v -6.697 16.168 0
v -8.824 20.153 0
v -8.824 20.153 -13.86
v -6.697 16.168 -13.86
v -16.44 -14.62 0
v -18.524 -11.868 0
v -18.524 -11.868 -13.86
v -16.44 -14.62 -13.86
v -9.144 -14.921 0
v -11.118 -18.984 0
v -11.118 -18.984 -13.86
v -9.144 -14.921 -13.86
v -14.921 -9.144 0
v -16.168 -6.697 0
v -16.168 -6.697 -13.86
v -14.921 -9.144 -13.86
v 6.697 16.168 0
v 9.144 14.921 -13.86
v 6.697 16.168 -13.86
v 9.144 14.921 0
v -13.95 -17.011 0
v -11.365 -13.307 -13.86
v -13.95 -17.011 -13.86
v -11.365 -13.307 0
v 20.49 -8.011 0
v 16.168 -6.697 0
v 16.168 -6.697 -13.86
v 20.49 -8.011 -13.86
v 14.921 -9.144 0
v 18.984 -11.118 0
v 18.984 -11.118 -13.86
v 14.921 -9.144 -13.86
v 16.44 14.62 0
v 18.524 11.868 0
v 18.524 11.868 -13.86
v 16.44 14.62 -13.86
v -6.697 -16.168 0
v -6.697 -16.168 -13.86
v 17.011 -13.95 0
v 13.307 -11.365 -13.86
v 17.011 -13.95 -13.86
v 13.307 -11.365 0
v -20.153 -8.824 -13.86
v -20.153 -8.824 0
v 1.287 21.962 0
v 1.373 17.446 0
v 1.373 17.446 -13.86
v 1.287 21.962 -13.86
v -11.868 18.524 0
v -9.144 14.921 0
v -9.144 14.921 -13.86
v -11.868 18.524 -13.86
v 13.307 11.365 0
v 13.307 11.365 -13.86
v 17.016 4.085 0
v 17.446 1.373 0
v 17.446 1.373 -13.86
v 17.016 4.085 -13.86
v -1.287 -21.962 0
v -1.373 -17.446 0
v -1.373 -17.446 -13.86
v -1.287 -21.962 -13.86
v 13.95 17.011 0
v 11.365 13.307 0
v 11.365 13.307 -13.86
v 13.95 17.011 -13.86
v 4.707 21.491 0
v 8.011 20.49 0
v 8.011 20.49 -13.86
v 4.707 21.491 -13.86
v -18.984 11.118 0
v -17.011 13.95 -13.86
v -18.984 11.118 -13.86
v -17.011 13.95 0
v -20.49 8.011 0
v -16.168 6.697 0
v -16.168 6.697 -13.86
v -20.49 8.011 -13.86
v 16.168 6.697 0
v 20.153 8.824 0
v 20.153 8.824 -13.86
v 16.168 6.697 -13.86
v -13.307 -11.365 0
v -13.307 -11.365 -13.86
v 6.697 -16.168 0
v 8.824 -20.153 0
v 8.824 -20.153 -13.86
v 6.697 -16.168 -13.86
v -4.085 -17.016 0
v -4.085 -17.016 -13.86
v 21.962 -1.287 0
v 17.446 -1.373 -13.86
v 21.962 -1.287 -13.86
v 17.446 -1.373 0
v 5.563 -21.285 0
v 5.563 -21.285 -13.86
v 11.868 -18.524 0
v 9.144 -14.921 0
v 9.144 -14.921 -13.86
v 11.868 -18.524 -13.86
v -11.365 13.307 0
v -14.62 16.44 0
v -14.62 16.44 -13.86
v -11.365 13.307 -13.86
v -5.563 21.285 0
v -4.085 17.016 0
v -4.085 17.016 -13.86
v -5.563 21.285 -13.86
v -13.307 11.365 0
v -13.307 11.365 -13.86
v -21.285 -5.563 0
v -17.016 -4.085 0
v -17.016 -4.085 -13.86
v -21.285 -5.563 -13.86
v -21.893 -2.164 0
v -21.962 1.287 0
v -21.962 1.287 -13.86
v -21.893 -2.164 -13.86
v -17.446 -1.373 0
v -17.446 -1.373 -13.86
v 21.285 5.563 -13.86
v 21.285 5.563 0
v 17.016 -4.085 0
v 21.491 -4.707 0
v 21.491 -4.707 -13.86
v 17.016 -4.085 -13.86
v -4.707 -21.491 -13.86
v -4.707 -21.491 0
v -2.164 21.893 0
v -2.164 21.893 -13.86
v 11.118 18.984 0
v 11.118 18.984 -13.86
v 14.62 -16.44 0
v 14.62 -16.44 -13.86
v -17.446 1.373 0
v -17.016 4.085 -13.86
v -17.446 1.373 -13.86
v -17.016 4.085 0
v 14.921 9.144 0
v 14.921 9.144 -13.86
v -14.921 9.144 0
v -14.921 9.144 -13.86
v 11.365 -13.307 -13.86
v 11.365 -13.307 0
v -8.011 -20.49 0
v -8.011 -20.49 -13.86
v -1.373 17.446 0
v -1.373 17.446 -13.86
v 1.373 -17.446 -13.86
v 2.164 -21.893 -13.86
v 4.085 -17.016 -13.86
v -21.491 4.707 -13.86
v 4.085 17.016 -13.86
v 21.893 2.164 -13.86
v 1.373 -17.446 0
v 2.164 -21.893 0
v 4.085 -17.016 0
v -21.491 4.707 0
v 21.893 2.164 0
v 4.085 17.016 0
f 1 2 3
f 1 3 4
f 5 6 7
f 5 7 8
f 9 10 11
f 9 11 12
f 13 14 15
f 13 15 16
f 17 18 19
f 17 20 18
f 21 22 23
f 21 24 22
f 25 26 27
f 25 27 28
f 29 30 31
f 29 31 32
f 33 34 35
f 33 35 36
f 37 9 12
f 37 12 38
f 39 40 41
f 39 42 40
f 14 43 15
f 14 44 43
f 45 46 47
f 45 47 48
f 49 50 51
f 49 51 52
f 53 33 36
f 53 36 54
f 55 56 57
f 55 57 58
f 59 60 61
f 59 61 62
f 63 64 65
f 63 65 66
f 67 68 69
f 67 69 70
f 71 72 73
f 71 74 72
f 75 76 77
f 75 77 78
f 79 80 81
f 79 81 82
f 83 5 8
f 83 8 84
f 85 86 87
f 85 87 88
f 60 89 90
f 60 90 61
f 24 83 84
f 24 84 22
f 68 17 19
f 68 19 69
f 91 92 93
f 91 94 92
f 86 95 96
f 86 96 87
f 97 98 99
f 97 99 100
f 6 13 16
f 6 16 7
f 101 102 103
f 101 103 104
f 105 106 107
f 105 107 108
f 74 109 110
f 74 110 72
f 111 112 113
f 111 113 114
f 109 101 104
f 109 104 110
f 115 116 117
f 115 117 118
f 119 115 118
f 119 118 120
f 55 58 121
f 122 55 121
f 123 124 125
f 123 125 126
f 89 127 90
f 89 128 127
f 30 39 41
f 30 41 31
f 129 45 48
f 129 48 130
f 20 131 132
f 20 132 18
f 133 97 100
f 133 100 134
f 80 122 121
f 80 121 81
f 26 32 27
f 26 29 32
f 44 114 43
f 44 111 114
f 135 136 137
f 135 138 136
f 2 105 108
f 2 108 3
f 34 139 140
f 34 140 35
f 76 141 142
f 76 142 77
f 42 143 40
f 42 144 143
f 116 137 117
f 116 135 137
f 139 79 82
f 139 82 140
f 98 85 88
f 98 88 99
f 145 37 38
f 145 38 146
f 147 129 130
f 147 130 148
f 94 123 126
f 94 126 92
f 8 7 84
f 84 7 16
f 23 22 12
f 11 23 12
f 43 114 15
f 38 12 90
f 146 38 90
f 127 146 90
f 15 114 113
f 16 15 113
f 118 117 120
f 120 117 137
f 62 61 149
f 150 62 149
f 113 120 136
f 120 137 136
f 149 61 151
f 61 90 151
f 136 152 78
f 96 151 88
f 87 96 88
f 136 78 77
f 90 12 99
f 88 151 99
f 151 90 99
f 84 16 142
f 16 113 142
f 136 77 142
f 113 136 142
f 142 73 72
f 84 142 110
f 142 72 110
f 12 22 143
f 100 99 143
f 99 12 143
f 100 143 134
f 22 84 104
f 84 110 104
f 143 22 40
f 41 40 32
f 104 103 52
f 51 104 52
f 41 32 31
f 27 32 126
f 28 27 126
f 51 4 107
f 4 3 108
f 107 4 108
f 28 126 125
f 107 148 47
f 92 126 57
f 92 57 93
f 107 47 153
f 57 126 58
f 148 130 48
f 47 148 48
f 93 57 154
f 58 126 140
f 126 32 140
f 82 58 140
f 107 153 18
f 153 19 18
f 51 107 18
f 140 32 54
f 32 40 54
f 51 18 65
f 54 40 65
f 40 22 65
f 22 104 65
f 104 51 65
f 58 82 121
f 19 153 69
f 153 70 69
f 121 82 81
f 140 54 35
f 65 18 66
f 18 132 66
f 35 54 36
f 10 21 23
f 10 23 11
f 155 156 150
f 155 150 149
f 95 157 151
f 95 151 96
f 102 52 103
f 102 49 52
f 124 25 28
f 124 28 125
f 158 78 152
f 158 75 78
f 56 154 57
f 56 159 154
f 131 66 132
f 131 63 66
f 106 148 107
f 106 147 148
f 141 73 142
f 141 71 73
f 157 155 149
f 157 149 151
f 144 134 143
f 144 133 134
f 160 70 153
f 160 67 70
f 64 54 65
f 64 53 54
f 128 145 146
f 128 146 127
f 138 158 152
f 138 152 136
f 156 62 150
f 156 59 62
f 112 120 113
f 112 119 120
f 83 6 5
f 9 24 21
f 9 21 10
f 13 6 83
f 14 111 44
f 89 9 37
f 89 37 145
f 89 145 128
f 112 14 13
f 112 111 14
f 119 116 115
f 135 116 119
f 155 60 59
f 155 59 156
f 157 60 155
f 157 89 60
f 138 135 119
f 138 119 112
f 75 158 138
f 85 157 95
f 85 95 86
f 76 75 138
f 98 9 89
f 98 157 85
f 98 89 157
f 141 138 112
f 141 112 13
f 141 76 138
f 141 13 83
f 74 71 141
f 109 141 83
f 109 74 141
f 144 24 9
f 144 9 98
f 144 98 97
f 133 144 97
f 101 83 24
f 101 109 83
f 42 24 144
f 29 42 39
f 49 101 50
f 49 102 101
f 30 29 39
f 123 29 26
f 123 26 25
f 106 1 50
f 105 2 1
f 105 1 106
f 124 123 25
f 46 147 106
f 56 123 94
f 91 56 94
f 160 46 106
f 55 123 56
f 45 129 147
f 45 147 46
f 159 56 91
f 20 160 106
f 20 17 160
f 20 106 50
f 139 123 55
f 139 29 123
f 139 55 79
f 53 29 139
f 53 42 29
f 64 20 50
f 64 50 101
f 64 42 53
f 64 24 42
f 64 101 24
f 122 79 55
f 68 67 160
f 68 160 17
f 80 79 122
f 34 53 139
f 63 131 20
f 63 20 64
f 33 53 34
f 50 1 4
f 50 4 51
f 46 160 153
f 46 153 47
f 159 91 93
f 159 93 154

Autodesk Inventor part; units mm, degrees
ref_plane "YZ Plane" through (0, 0, 0) normal (1, 0, 0) x (0, 1, 0)
ref_plane "XZ Plane" through (0, 0, 0) normal (0, 1, 0) x (-1, 0, 0)
ref_plane "XY Plane" through (0, 0, 0) normal (0, 0, 1) x (1, 0, 0)
sketch "Gear_Profile_Sketch" plane through (0, 0, 0) normal (0, 0, 1) x (1, 0, 0)
  line L0 (17.4461, -1.373) -> (21.9623, -1.2871)
  line L1 (21.9623, -1.2871) -> (21.8933, 2.1644)
  line L2 (21.8933, 2.1644) -> (17.4461, 1.373)
  line L3 (17.4461, 1.373) -> (17.0165, 4.0853)
  line L4 (17.0165, 4.0853) -> (21.2852, 5.5626)
  line L5 (21.2852, 5.5626) -> (20.1529, 8.8238)
  line L6 (20.1529, 8.8238) -> (16.1679, 6.697)
  line L7 (16.1679, 6.697) -> (14.9212, 9.1437)
  line L8 (14.9212, 9.1437) -> (18.5244, 11.8678)
  line L9 (18.5244, 11.8678) -> (16.4398, 14.6196)
  line L10 (16.4398, 14.6196) -> (13.3071, 11.3653)
  line L11 (13.3071, 11.3653) -> (11.3653, 13.3071)
  line L12 (11.3653, 13.3071) -> (13.9504, 17.0113)
  line L13 (13.9504, 17.0113) -> (11.1175, 18.9842)
  line L14 (11.1175, 18.9842) -> (9.1437, 14.9212)
  line L15 (9.1437, 14.9212) -> (6.697, 16.1679)
  line L16 (6.697, 16.1679) -> (8.0109, 20.4897)
  line L17 (8.0109, 20.4897) -> (4.707, 21.4906)
  line L18 (4.707, 21.4906) -> (4.0853, 17.0165)
  line L19 (4.0853, 17.0165) -> (1.373, 17.4461)
  line L20 (1.373, 17.4461) -> (1.2871, 21.9623)
  line L21 (1.2871, 21.9623) -> (-2.1644, 21.8933)
  line L22 (-2.1644, 21.8933) -> (-1.373, 17.4461)
  line L23 (-1.373, 17.4461) -> (-4.0853, 17.0165)
  line L24 (-4.0853, 17.0165) -> (-5.5626, 21.2852)
  line L25 (-5.5626, 21.2852) -> (-8.8238, 20.1529)
  line L26 (-8.8238, 20.1529) -> (-6.697, 16.1679)
  line L27 (-6.697, 16.1679) -> (-9.1437, 14.9212)
  line L28 (-9.1437, 14.9212) -> (-11.8678, 18.5244)
  line L29 (-11.8678, 18.5244) -> (-14.6196, 16.4398)
  line L30 (-14.6196, 16.4398) -> (-11.3653, 13.3071)
  line L31 (-11.3653, 13.3071) -> (-13.3071, 11.3653)
  line L32 (-13.3071, 11.3653) -> (-17.0113, 13.9504)
  line L33 (-17.0113, 13.9504) -> (-18.9842, 11.1175)
  line L34 (-18.9842, 11.1175) -> (-14.9212, 9.1437)
  line L35 (-14.9212, 9.1437) -> (-16.1679, 6.697)
  line L36 (-16.1679, 6.697) -> (-20.4897, 8.0109)
  line L37 (-20.4897, 8.0109) -> (-21.4906, 4.707)
  line L38 (-21.4906, 4.707) -> (-17.0165, 4.0853)
  line L39 (-17.0165, 4.0853) -> (-17.4461, 1.373)
  line L40 (-17.4461, 1.373) -> (-21.9623, 1.2871)
  line L41 (-21.9623, 1.2871) -> (-21.8933, -2.1644)
  line L42 (-21.8933, -2.1644) -> (-17.4461, -1.373)
  line L43 (-17.4461, -1.373) -> (-17.0165, -4.0853)
  line L44 (-17.0165, -4.0853) -> (-21.2852, -5.5626)
  line L45 (-21.2852, -5.5626) -> (-20.1529, -8.8238)
  line L46 (-20.1529, -8.8238) -> (-16.1679, -6.697)
  line L47 (-16.1679, -6.697) -> (-14.9212, -9.1437)
  line L48 (-14.9212, -9.1437) -> (-18.5244, -11.8678)
  line L49 (-18.5244, -11.8678) -> (-16.4398, -14.6196)
  line L50 (-16.4398, -14.6196) -> (-13.3071, -11.3653)
  line L51 (-13.3071, -11.3653) -> (-11.3653, -13.3071)
  line L52 (-11.3653, -13.3071) -> (-13.9504, -17.0113)
  line L53 (-13.9504, -17.0113) -> (-11.1175, -18.9842)
  line L54 (-11.1175, -18.9842) -> (-9.1437, -14.9212)
  line L55 (-9.1437, -14.9212) -> (-6.697, -16.1679)
  line L56 (-6.697, -16.1679) -> (-8.0109, -20.4897)
  line L57 (-8.0109, -20.4897) -> (-4.707, -21.4906)
  line L58 (-4.707, -21.4906) -> (-4.0853, -17.0165)
  line L59 (-4.0853, -17.0165) -> (-1.373, -17.4461)
  line L60 (-1.373, -17.4461) -> (-1.2871, -21.9623)
  line L61 (-1.2871, -21.9623) -> (2.1644, -21.8933)
  line L62 (2.1644, -21.8933) -> (1.373, -17.4461)
  line L63 (1.373, -17.4461) -> (4.0853, -17.0165)
  line L64 (4.0853, -17.0165) -> (5.5626, -21.2852)
  line L65 (5.5626, -21.2852) -> (8.8238, -20.1529)
  line L66 (8.8238, -20.1529) -> (6.697, -16.1679)
  line L67 (6.697, -16.1679) -> (9.1437, -14.9212)
  line L68 (9.1437, -14.9212) -> (11.8678, -18.5244)
  line L69 (11.8678, -18.5244) -> (14.6196, -16.4398)
  line L70 (14.6196, -16.4398) -> (11.3653, -13.3071)
  line L71 (11.3653, -13.3071) -> (13.3071, -11.3653)
  line L72 (13.3071, -11.3653) -> (17.0113, -13.9504)
  line L73 (17.0113, -13.9504) -> (18.9842, -11.1175)
  line L74 (18.9842, -11.1175) -> (14.9212, -9.1437)
  line L75 (14.9212, -9.1437) -> (16.1679, -6.697)
  line L76 (16.1679, -6.697) -> (20.4897, -8.0109)
  line L77 (20.4897, -8.0109) -> (21.4906, -4.707)
  line L78 (21.4906, -4.707) -> (17.0165, -4.0853)
  line L79 (17.0165, -4.0853) -> (17.4461, -1.373)
extrude "Extrusion1" add sketch "Gear_Profile_Sketch" against normal blind 13.86
properties part number "pinn_optimized_geometry"
